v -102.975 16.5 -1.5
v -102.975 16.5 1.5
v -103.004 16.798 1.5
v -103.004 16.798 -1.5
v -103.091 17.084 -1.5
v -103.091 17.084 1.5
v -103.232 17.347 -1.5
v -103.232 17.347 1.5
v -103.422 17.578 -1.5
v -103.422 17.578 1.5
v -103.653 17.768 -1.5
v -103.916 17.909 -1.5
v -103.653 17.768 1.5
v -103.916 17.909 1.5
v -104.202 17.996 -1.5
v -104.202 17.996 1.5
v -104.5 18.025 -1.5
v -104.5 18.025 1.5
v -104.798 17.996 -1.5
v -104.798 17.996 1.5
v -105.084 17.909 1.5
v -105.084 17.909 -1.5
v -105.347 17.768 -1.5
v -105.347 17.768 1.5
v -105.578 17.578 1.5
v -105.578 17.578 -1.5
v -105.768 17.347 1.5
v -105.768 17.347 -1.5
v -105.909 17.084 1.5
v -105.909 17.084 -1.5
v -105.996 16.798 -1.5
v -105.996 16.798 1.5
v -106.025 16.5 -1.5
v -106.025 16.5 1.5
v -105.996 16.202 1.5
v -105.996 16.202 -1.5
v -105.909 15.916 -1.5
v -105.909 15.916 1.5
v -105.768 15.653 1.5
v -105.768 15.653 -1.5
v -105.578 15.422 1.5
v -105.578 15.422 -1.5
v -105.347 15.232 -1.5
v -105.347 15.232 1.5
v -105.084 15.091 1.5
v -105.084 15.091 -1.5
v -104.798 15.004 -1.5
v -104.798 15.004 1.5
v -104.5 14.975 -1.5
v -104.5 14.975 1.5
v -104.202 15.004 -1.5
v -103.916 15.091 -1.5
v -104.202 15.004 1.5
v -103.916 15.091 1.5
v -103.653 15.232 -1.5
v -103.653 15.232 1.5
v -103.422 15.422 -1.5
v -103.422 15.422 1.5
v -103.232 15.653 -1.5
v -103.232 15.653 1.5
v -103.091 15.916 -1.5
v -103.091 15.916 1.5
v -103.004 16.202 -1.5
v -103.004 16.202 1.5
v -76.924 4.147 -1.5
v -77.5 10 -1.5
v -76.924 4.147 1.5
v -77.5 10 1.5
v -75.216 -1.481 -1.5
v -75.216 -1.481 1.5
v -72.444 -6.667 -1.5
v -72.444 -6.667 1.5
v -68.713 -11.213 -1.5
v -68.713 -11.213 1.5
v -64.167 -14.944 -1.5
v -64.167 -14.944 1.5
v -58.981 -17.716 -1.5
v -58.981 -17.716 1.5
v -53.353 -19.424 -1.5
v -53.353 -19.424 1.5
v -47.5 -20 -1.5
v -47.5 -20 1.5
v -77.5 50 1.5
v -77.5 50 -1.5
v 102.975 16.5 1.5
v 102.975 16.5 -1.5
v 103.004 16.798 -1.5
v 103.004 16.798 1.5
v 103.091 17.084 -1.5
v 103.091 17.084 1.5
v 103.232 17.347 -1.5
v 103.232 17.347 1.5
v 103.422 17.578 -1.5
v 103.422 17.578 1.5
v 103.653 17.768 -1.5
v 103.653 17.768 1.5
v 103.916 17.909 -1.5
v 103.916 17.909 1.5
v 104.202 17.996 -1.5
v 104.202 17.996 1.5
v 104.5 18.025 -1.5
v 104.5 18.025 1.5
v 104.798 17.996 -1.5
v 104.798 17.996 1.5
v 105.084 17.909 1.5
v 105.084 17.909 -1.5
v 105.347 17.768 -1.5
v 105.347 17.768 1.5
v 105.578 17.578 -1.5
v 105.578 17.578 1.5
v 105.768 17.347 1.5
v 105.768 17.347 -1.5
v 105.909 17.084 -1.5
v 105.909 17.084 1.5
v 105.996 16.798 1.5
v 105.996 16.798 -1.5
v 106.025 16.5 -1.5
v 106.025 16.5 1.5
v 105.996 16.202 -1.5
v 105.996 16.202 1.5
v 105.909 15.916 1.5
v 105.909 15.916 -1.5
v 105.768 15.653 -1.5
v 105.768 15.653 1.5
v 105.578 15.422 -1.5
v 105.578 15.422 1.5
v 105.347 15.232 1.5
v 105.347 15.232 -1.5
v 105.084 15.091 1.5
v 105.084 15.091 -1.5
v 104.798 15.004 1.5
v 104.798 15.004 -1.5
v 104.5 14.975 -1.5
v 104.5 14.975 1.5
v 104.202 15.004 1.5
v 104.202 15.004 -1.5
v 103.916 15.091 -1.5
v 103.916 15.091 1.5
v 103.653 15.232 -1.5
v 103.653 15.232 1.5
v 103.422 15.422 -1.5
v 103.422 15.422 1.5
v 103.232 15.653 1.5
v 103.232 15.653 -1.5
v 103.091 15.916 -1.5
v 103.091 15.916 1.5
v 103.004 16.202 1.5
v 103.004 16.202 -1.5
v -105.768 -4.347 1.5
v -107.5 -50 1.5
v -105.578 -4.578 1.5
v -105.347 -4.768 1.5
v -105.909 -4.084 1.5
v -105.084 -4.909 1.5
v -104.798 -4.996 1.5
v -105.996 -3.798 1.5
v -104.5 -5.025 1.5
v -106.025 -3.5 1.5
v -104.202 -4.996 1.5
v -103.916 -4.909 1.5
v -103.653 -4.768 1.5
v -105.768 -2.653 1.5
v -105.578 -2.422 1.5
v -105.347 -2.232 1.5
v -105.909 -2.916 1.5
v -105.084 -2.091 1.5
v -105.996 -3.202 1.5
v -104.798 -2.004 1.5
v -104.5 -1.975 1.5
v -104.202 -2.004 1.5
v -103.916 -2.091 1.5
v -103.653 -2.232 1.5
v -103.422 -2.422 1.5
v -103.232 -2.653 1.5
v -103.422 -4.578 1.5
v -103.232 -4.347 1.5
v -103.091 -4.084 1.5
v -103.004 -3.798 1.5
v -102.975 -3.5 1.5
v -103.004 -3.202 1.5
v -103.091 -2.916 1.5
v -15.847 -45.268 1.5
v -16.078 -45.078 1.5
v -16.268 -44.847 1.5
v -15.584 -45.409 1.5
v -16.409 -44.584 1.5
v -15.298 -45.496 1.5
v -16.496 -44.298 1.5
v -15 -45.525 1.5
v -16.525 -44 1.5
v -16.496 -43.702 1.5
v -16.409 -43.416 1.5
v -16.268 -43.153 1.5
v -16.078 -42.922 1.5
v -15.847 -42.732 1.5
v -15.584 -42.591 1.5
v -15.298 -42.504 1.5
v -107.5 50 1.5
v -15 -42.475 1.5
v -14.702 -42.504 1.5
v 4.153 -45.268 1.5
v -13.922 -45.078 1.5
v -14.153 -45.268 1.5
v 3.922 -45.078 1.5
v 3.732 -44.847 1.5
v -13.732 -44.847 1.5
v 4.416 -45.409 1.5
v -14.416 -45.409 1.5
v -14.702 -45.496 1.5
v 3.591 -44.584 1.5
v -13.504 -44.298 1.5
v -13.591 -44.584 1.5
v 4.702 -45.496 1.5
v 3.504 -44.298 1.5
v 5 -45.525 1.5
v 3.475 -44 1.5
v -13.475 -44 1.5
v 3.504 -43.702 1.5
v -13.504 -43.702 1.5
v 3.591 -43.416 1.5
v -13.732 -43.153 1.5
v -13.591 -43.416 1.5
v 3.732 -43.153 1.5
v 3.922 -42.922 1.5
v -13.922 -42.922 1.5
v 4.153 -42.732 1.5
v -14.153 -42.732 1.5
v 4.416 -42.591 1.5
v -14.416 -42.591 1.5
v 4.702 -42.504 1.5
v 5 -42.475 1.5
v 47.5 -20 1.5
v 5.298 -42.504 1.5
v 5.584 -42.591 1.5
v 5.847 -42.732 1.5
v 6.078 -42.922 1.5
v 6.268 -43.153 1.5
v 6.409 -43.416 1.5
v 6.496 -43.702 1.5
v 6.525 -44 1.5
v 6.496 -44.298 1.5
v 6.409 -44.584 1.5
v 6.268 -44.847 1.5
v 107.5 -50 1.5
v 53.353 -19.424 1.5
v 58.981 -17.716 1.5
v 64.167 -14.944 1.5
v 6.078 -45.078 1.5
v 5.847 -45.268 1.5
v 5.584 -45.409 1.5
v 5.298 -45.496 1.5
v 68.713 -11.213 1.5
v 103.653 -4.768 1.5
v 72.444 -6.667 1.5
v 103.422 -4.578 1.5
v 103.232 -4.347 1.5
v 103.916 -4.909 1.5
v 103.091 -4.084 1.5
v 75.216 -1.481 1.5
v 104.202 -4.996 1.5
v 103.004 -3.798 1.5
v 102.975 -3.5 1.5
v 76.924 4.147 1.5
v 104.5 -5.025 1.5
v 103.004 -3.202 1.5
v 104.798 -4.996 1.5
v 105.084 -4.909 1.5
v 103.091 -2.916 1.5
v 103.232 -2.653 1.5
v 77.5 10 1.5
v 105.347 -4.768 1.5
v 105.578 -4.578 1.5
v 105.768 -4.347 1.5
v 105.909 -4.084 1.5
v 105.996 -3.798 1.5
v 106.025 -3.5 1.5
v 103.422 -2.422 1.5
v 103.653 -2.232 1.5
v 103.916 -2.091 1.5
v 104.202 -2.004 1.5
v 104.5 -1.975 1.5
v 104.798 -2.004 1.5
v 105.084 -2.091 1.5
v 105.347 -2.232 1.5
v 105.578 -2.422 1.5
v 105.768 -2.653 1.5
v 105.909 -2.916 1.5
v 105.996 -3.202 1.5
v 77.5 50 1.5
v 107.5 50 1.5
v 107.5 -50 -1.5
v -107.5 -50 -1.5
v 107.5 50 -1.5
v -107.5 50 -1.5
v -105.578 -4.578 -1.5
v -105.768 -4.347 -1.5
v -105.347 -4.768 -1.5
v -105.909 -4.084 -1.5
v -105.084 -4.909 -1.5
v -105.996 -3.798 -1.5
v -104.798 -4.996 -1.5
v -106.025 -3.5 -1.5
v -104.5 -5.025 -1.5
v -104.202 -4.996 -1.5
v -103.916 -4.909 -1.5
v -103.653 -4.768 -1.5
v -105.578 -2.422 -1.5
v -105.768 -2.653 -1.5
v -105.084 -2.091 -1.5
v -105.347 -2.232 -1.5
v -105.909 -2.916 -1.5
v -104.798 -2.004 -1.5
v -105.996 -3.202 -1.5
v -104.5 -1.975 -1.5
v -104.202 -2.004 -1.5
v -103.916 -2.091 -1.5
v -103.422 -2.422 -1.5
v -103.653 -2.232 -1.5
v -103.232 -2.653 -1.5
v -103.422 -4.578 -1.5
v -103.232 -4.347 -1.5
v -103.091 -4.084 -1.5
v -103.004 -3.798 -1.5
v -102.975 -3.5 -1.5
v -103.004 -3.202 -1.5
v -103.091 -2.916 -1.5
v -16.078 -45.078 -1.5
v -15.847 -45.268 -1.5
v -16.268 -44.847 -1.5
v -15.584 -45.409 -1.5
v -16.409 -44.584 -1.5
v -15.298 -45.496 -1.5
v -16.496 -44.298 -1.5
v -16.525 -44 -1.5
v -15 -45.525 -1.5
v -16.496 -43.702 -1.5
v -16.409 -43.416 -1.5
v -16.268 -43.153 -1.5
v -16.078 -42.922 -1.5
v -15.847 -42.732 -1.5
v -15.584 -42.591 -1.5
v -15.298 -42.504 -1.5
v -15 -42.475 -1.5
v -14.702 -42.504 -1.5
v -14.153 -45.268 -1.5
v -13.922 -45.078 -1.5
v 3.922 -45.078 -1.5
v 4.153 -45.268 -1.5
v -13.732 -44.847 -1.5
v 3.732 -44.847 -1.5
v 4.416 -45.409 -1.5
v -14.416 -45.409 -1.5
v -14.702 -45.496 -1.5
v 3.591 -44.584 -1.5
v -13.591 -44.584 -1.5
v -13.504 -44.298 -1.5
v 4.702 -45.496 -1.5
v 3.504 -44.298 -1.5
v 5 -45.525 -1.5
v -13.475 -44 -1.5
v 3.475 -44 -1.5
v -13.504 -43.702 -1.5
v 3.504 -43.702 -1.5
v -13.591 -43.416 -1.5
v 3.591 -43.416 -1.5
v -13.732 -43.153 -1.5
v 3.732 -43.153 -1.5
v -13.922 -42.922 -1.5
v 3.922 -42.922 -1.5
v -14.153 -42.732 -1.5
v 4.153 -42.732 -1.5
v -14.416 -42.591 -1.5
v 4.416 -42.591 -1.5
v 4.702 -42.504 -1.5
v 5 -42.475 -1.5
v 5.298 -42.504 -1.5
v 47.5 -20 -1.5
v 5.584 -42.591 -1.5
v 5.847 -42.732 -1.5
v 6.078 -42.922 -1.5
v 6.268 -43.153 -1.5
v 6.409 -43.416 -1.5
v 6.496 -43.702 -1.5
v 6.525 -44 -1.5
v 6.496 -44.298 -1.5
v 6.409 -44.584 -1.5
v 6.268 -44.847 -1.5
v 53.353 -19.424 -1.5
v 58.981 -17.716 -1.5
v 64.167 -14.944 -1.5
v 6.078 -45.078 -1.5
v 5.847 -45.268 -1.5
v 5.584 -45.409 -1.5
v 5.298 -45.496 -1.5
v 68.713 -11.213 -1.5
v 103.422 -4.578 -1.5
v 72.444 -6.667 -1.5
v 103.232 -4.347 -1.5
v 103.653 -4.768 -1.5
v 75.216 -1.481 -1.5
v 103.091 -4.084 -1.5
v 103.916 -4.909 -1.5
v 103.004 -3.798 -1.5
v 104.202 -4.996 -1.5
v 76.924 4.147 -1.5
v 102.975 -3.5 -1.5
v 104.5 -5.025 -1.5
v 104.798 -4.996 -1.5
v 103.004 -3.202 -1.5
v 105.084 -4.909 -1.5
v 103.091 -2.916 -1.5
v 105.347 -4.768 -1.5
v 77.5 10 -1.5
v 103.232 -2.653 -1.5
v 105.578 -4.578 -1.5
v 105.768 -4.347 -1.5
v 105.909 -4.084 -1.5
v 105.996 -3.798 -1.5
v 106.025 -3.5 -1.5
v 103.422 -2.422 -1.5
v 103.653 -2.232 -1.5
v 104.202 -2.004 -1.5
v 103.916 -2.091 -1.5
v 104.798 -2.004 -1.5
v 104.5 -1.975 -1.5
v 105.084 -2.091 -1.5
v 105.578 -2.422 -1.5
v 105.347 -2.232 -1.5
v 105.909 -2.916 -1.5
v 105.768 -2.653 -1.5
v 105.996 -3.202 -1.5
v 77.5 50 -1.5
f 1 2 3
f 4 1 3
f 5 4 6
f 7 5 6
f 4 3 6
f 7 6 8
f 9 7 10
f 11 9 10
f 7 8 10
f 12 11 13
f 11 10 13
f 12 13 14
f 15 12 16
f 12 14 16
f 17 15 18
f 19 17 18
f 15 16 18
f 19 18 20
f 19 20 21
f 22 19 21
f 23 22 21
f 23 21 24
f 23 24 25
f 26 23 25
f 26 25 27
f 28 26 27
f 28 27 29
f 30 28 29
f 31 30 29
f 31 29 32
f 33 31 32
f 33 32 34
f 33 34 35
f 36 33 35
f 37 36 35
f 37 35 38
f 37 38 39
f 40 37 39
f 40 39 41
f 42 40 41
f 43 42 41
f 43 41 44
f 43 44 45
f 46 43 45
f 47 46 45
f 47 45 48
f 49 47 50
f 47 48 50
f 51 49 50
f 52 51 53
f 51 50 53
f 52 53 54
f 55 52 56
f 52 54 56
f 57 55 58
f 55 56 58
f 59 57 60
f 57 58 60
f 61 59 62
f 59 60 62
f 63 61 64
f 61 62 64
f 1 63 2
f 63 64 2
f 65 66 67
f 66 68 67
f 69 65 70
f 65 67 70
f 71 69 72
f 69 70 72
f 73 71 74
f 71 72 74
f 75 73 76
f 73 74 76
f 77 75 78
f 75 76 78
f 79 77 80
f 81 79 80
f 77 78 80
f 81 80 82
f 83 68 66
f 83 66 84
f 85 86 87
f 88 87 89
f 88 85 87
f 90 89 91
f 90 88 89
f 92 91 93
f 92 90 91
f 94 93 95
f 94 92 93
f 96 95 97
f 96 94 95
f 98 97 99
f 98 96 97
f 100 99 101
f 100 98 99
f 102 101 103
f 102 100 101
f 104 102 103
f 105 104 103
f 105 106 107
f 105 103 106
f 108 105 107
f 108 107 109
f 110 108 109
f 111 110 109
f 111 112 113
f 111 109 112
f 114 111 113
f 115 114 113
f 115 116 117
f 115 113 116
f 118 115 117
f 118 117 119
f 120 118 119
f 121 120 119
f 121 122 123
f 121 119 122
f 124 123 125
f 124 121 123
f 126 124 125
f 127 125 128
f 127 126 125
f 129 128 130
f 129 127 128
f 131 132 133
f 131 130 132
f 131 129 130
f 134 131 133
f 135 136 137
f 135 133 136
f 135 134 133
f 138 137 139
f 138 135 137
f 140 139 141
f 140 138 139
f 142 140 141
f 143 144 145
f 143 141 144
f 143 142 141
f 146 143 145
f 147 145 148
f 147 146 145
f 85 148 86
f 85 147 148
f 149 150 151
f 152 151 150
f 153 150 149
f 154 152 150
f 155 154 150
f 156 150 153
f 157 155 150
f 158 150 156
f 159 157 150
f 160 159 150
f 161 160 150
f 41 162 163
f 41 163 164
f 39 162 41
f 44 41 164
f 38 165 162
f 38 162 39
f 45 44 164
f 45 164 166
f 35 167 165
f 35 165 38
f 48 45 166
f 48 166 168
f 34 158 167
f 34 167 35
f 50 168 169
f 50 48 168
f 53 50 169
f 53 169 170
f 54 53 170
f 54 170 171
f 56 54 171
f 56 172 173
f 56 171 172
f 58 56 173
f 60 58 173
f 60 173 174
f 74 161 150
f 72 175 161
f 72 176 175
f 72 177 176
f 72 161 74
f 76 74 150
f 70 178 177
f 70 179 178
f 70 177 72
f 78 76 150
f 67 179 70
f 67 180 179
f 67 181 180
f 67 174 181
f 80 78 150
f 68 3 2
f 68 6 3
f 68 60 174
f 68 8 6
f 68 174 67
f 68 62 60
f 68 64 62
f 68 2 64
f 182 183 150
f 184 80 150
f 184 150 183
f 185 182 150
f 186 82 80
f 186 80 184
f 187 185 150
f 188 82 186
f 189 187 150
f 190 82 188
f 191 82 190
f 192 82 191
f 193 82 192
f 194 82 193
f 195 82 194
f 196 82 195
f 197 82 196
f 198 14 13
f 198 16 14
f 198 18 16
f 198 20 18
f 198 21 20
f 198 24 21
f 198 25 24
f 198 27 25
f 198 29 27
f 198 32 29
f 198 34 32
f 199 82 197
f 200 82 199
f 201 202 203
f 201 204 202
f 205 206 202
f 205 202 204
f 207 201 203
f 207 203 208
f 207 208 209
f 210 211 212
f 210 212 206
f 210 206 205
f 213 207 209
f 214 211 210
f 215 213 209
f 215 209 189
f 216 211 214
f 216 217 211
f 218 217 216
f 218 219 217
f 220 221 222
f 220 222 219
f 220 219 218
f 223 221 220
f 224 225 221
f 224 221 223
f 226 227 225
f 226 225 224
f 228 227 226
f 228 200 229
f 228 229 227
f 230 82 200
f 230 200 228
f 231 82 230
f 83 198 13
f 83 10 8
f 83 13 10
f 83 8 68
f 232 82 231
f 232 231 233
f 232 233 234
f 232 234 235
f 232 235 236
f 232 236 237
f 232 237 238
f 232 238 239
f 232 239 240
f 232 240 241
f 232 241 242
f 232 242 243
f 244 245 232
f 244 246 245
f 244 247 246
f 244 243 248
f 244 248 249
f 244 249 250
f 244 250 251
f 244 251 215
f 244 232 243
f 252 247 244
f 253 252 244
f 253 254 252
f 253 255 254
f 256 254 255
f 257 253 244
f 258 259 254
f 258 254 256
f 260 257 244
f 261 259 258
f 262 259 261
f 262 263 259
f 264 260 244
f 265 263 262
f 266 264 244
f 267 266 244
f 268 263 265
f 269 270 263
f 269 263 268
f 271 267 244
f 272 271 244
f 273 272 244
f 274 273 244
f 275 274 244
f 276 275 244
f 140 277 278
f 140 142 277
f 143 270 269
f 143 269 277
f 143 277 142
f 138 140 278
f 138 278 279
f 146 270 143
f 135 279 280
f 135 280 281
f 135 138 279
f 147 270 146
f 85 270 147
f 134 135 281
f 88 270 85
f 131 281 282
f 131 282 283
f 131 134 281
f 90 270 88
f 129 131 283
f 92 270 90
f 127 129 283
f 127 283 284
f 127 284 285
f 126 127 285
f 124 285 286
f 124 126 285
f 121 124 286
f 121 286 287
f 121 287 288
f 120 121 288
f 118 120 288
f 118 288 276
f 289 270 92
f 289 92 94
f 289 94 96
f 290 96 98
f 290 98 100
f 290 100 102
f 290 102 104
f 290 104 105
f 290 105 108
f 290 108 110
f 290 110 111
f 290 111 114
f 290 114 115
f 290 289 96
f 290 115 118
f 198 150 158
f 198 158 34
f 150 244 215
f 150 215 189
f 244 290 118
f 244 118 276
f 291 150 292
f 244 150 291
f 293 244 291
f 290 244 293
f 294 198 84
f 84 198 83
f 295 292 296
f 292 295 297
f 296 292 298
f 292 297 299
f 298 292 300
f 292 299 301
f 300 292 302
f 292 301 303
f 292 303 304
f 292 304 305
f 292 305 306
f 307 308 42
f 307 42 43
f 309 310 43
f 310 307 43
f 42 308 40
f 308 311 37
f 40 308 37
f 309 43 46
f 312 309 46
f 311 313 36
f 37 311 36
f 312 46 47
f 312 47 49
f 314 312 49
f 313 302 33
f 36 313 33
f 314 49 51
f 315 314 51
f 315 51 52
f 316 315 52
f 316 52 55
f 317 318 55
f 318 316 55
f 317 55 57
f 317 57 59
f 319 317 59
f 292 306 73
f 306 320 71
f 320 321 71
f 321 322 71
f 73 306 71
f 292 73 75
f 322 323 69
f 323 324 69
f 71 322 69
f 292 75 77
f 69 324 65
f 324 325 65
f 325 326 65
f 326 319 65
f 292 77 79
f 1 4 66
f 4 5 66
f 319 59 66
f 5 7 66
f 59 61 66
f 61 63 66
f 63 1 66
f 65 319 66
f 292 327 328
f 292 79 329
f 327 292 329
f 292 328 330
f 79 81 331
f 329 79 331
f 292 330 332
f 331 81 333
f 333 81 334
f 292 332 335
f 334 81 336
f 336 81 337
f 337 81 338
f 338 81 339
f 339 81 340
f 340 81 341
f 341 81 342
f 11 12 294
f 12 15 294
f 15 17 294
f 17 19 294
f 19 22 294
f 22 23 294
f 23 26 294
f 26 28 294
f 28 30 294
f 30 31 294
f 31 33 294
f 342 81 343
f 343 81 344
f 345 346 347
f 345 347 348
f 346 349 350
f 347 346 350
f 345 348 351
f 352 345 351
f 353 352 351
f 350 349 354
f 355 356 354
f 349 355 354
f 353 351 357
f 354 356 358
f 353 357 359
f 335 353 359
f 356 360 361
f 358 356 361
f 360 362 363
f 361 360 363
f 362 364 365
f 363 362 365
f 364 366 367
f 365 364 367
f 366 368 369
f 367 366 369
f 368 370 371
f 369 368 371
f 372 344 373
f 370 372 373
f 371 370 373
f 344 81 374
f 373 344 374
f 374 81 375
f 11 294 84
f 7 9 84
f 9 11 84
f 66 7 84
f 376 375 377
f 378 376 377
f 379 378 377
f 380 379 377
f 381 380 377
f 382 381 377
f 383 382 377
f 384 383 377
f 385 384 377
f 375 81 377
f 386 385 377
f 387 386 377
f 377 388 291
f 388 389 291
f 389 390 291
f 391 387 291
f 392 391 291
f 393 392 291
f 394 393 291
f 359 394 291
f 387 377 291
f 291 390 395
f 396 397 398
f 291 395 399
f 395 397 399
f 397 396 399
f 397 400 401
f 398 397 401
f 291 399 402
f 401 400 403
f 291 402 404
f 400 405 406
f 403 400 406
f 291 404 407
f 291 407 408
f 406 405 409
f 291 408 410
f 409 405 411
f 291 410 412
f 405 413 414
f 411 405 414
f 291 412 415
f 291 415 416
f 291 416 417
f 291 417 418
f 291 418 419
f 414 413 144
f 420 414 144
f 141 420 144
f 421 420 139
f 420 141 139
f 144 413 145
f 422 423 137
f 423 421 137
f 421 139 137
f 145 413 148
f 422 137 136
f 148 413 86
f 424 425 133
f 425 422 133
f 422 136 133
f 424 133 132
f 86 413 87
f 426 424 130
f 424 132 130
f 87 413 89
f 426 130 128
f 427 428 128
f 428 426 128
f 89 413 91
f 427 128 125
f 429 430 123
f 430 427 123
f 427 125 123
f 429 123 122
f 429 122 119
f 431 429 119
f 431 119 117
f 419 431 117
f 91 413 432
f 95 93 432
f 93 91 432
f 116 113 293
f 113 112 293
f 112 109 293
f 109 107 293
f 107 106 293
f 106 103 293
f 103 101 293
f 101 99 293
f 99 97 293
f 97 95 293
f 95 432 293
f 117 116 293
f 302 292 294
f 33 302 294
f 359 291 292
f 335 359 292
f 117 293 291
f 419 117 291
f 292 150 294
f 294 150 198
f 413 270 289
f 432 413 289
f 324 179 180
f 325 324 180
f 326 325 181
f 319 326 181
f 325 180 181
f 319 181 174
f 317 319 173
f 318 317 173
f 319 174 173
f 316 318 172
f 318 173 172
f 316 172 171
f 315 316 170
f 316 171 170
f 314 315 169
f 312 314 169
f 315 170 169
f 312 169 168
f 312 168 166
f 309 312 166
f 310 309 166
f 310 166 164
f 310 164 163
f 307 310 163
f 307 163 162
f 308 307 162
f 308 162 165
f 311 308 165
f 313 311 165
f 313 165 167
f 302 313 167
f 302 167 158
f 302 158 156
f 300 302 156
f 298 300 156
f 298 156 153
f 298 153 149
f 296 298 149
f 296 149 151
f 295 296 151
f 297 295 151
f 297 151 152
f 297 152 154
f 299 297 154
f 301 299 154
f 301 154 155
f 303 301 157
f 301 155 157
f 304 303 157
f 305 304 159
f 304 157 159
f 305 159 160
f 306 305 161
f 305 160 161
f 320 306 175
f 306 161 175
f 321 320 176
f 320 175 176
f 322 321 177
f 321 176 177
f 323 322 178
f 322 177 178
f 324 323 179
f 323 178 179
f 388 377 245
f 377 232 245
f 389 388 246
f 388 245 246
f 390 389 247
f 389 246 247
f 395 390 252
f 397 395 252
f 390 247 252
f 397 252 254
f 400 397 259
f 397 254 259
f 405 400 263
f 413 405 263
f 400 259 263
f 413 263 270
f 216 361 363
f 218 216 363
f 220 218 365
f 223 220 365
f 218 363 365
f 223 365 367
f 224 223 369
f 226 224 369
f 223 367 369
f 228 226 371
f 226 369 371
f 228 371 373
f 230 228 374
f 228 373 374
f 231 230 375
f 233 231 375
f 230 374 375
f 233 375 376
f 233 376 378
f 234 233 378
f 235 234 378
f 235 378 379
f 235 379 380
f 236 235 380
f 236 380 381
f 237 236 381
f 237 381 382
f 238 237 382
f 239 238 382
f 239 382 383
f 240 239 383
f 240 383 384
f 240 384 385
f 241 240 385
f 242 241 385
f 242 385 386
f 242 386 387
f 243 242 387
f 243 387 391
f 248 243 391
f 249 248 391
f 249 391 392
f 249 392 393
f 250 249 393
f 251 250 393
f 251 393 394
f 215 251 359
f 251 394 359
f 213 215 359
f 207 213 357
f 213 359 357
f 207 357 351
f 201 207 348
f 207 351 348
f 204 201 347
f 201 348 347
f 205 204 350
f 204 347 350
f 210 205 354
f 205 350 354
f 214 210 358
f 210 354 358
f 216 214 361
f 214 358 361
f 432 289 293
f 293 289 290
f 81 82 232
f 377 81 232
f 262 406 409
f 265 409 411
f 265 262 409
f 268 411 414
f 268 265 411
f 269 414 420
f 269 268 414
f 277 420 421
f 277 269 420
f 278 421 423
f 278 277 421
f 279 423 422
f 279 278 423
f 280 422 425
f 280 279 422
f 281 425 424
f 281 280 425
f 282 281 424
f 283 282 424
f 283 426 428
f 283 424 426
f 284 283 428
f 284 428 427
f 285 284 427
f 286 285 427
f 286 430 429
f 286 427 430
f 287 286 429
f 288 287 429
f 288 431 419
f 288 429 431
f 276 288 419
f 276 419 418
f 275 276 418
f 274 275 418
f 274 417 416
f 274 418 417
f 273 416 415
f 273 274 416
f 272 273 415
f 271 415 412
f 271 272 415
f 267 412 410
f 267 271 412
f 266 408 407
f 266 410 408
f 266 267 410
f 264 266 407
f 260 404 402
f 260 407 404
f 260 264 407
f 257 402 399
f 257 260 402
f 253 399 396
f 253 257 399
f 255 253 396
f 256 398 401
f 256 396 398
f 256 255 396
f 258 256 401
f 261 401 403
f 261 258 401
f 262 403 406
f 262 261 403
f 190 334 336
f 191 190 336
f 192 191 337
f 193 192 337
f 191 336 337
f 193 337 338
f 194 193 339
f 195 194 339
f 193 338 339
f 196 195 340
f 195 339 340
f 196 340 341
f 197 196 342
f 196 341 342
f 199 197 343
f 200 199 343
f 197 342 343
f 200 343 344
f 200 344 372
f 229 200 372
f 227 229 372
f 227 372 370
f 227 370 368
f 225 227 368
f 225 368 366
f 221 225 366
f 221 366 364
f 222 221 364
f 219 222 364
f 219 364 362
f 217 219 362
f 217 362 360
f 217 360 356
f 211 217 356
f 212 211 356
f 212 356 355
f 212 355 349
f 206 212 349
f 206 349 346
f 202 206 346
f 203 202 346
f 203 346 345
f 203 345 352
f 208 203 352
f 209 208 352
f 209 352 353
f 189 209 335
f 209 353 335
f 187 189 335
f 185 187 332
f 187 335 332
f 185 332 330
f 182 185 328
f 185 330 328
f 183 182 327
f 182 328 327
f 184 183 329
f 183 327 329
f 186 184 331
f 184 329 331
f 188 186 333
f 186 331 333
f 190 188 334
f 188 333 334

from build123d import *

# Parameters (mm, degrees)
SKETCH_1_W          = 215
SKETCH_1_H          = 100
EXTRUDE_1_DEPTH     = 1.5
SKETCH_2_W          = 155
SKETCH_2_H          = 140
CUT_EXTRUDE_1_DEPTH = 21.5
FILLET_1_R          = 30
SKETCH_3_R          = 1.525
CUT_EXTRUDE_2_DEPTH = 10
SKETCH_4_R          = 1.525
CUT_EXTRUDE_3_DEPTH = 10


with BuildPart() as part:
    # 草图1 → 凸台-拉伸1 (new body, symmetric)
    with BuildSketch(Plane.XY):
        Rectangle(SKETCH_1_W, SKETCH_1_H)
    extrude(amount=EXTRUDE_1_DEPTH, both=True)

    # 草图2 → 切除-拉伸1 (cut, symmetric)
    with BuildSketch(Plane.XY.offset(1.5)):
        with Locations((0, 50)):
            Rectangle(SKETCH_2_W, SKETCH_2_H)
    extrude(amount=CUT_EXTRUDE_1_DEPTH, both=True, mode=Mode.SUBTRACT)

    # 圆角1
    fillet_1_edges = [part.edges().sort_by_distance(p)[0] for p in [
        (77.5, -20, 0),
        (-77.5, -20, 0),
    ]]
    fillet(fillet_1_edges, radius=FILLET_1_R)

    # 草图3 → 切除-拉伸2 (cut)
    with BuildSketch(Plane(origin=(0, 0, -1.5), x_dir=(-1, 0, 0), z_dir=(0, 0, -1))):
        with Locations((-5, -44)):
            Circle(SKETCH_3_R)
        with Locations((15, -44)):
            Circle(SKETCH_3_R)
    extrude(amount=-CUT_EXTRUDE_2_DEPTH, mode=Mode.SUBTRACT)

    # 草图4 → 切除-拉伸3 (cut)
    with BuildSketch(Plane.XY.offset(1.5)):
        with Locations((-104.5, 16.5)):
            Circle(SKETCH_4_R)
        with Locations((-104.5, -3.5)):
            Circle(SKETCH_4_R)
    cut_extrude_3 = extrude(amount=-CUT_EXTRUDE_3_DEPTH, mode=Mode.SUBTRACT)

    # 镜向1: 切除-拉伸3 across plane
    add(cut_extrude_3.mirror(Plane(origin=(0, 0, 0), x_dir=(0, 0, 1), z_dir=(1, 0, 0))), mode=Mode.SUBTRACT)


solid = part.part
